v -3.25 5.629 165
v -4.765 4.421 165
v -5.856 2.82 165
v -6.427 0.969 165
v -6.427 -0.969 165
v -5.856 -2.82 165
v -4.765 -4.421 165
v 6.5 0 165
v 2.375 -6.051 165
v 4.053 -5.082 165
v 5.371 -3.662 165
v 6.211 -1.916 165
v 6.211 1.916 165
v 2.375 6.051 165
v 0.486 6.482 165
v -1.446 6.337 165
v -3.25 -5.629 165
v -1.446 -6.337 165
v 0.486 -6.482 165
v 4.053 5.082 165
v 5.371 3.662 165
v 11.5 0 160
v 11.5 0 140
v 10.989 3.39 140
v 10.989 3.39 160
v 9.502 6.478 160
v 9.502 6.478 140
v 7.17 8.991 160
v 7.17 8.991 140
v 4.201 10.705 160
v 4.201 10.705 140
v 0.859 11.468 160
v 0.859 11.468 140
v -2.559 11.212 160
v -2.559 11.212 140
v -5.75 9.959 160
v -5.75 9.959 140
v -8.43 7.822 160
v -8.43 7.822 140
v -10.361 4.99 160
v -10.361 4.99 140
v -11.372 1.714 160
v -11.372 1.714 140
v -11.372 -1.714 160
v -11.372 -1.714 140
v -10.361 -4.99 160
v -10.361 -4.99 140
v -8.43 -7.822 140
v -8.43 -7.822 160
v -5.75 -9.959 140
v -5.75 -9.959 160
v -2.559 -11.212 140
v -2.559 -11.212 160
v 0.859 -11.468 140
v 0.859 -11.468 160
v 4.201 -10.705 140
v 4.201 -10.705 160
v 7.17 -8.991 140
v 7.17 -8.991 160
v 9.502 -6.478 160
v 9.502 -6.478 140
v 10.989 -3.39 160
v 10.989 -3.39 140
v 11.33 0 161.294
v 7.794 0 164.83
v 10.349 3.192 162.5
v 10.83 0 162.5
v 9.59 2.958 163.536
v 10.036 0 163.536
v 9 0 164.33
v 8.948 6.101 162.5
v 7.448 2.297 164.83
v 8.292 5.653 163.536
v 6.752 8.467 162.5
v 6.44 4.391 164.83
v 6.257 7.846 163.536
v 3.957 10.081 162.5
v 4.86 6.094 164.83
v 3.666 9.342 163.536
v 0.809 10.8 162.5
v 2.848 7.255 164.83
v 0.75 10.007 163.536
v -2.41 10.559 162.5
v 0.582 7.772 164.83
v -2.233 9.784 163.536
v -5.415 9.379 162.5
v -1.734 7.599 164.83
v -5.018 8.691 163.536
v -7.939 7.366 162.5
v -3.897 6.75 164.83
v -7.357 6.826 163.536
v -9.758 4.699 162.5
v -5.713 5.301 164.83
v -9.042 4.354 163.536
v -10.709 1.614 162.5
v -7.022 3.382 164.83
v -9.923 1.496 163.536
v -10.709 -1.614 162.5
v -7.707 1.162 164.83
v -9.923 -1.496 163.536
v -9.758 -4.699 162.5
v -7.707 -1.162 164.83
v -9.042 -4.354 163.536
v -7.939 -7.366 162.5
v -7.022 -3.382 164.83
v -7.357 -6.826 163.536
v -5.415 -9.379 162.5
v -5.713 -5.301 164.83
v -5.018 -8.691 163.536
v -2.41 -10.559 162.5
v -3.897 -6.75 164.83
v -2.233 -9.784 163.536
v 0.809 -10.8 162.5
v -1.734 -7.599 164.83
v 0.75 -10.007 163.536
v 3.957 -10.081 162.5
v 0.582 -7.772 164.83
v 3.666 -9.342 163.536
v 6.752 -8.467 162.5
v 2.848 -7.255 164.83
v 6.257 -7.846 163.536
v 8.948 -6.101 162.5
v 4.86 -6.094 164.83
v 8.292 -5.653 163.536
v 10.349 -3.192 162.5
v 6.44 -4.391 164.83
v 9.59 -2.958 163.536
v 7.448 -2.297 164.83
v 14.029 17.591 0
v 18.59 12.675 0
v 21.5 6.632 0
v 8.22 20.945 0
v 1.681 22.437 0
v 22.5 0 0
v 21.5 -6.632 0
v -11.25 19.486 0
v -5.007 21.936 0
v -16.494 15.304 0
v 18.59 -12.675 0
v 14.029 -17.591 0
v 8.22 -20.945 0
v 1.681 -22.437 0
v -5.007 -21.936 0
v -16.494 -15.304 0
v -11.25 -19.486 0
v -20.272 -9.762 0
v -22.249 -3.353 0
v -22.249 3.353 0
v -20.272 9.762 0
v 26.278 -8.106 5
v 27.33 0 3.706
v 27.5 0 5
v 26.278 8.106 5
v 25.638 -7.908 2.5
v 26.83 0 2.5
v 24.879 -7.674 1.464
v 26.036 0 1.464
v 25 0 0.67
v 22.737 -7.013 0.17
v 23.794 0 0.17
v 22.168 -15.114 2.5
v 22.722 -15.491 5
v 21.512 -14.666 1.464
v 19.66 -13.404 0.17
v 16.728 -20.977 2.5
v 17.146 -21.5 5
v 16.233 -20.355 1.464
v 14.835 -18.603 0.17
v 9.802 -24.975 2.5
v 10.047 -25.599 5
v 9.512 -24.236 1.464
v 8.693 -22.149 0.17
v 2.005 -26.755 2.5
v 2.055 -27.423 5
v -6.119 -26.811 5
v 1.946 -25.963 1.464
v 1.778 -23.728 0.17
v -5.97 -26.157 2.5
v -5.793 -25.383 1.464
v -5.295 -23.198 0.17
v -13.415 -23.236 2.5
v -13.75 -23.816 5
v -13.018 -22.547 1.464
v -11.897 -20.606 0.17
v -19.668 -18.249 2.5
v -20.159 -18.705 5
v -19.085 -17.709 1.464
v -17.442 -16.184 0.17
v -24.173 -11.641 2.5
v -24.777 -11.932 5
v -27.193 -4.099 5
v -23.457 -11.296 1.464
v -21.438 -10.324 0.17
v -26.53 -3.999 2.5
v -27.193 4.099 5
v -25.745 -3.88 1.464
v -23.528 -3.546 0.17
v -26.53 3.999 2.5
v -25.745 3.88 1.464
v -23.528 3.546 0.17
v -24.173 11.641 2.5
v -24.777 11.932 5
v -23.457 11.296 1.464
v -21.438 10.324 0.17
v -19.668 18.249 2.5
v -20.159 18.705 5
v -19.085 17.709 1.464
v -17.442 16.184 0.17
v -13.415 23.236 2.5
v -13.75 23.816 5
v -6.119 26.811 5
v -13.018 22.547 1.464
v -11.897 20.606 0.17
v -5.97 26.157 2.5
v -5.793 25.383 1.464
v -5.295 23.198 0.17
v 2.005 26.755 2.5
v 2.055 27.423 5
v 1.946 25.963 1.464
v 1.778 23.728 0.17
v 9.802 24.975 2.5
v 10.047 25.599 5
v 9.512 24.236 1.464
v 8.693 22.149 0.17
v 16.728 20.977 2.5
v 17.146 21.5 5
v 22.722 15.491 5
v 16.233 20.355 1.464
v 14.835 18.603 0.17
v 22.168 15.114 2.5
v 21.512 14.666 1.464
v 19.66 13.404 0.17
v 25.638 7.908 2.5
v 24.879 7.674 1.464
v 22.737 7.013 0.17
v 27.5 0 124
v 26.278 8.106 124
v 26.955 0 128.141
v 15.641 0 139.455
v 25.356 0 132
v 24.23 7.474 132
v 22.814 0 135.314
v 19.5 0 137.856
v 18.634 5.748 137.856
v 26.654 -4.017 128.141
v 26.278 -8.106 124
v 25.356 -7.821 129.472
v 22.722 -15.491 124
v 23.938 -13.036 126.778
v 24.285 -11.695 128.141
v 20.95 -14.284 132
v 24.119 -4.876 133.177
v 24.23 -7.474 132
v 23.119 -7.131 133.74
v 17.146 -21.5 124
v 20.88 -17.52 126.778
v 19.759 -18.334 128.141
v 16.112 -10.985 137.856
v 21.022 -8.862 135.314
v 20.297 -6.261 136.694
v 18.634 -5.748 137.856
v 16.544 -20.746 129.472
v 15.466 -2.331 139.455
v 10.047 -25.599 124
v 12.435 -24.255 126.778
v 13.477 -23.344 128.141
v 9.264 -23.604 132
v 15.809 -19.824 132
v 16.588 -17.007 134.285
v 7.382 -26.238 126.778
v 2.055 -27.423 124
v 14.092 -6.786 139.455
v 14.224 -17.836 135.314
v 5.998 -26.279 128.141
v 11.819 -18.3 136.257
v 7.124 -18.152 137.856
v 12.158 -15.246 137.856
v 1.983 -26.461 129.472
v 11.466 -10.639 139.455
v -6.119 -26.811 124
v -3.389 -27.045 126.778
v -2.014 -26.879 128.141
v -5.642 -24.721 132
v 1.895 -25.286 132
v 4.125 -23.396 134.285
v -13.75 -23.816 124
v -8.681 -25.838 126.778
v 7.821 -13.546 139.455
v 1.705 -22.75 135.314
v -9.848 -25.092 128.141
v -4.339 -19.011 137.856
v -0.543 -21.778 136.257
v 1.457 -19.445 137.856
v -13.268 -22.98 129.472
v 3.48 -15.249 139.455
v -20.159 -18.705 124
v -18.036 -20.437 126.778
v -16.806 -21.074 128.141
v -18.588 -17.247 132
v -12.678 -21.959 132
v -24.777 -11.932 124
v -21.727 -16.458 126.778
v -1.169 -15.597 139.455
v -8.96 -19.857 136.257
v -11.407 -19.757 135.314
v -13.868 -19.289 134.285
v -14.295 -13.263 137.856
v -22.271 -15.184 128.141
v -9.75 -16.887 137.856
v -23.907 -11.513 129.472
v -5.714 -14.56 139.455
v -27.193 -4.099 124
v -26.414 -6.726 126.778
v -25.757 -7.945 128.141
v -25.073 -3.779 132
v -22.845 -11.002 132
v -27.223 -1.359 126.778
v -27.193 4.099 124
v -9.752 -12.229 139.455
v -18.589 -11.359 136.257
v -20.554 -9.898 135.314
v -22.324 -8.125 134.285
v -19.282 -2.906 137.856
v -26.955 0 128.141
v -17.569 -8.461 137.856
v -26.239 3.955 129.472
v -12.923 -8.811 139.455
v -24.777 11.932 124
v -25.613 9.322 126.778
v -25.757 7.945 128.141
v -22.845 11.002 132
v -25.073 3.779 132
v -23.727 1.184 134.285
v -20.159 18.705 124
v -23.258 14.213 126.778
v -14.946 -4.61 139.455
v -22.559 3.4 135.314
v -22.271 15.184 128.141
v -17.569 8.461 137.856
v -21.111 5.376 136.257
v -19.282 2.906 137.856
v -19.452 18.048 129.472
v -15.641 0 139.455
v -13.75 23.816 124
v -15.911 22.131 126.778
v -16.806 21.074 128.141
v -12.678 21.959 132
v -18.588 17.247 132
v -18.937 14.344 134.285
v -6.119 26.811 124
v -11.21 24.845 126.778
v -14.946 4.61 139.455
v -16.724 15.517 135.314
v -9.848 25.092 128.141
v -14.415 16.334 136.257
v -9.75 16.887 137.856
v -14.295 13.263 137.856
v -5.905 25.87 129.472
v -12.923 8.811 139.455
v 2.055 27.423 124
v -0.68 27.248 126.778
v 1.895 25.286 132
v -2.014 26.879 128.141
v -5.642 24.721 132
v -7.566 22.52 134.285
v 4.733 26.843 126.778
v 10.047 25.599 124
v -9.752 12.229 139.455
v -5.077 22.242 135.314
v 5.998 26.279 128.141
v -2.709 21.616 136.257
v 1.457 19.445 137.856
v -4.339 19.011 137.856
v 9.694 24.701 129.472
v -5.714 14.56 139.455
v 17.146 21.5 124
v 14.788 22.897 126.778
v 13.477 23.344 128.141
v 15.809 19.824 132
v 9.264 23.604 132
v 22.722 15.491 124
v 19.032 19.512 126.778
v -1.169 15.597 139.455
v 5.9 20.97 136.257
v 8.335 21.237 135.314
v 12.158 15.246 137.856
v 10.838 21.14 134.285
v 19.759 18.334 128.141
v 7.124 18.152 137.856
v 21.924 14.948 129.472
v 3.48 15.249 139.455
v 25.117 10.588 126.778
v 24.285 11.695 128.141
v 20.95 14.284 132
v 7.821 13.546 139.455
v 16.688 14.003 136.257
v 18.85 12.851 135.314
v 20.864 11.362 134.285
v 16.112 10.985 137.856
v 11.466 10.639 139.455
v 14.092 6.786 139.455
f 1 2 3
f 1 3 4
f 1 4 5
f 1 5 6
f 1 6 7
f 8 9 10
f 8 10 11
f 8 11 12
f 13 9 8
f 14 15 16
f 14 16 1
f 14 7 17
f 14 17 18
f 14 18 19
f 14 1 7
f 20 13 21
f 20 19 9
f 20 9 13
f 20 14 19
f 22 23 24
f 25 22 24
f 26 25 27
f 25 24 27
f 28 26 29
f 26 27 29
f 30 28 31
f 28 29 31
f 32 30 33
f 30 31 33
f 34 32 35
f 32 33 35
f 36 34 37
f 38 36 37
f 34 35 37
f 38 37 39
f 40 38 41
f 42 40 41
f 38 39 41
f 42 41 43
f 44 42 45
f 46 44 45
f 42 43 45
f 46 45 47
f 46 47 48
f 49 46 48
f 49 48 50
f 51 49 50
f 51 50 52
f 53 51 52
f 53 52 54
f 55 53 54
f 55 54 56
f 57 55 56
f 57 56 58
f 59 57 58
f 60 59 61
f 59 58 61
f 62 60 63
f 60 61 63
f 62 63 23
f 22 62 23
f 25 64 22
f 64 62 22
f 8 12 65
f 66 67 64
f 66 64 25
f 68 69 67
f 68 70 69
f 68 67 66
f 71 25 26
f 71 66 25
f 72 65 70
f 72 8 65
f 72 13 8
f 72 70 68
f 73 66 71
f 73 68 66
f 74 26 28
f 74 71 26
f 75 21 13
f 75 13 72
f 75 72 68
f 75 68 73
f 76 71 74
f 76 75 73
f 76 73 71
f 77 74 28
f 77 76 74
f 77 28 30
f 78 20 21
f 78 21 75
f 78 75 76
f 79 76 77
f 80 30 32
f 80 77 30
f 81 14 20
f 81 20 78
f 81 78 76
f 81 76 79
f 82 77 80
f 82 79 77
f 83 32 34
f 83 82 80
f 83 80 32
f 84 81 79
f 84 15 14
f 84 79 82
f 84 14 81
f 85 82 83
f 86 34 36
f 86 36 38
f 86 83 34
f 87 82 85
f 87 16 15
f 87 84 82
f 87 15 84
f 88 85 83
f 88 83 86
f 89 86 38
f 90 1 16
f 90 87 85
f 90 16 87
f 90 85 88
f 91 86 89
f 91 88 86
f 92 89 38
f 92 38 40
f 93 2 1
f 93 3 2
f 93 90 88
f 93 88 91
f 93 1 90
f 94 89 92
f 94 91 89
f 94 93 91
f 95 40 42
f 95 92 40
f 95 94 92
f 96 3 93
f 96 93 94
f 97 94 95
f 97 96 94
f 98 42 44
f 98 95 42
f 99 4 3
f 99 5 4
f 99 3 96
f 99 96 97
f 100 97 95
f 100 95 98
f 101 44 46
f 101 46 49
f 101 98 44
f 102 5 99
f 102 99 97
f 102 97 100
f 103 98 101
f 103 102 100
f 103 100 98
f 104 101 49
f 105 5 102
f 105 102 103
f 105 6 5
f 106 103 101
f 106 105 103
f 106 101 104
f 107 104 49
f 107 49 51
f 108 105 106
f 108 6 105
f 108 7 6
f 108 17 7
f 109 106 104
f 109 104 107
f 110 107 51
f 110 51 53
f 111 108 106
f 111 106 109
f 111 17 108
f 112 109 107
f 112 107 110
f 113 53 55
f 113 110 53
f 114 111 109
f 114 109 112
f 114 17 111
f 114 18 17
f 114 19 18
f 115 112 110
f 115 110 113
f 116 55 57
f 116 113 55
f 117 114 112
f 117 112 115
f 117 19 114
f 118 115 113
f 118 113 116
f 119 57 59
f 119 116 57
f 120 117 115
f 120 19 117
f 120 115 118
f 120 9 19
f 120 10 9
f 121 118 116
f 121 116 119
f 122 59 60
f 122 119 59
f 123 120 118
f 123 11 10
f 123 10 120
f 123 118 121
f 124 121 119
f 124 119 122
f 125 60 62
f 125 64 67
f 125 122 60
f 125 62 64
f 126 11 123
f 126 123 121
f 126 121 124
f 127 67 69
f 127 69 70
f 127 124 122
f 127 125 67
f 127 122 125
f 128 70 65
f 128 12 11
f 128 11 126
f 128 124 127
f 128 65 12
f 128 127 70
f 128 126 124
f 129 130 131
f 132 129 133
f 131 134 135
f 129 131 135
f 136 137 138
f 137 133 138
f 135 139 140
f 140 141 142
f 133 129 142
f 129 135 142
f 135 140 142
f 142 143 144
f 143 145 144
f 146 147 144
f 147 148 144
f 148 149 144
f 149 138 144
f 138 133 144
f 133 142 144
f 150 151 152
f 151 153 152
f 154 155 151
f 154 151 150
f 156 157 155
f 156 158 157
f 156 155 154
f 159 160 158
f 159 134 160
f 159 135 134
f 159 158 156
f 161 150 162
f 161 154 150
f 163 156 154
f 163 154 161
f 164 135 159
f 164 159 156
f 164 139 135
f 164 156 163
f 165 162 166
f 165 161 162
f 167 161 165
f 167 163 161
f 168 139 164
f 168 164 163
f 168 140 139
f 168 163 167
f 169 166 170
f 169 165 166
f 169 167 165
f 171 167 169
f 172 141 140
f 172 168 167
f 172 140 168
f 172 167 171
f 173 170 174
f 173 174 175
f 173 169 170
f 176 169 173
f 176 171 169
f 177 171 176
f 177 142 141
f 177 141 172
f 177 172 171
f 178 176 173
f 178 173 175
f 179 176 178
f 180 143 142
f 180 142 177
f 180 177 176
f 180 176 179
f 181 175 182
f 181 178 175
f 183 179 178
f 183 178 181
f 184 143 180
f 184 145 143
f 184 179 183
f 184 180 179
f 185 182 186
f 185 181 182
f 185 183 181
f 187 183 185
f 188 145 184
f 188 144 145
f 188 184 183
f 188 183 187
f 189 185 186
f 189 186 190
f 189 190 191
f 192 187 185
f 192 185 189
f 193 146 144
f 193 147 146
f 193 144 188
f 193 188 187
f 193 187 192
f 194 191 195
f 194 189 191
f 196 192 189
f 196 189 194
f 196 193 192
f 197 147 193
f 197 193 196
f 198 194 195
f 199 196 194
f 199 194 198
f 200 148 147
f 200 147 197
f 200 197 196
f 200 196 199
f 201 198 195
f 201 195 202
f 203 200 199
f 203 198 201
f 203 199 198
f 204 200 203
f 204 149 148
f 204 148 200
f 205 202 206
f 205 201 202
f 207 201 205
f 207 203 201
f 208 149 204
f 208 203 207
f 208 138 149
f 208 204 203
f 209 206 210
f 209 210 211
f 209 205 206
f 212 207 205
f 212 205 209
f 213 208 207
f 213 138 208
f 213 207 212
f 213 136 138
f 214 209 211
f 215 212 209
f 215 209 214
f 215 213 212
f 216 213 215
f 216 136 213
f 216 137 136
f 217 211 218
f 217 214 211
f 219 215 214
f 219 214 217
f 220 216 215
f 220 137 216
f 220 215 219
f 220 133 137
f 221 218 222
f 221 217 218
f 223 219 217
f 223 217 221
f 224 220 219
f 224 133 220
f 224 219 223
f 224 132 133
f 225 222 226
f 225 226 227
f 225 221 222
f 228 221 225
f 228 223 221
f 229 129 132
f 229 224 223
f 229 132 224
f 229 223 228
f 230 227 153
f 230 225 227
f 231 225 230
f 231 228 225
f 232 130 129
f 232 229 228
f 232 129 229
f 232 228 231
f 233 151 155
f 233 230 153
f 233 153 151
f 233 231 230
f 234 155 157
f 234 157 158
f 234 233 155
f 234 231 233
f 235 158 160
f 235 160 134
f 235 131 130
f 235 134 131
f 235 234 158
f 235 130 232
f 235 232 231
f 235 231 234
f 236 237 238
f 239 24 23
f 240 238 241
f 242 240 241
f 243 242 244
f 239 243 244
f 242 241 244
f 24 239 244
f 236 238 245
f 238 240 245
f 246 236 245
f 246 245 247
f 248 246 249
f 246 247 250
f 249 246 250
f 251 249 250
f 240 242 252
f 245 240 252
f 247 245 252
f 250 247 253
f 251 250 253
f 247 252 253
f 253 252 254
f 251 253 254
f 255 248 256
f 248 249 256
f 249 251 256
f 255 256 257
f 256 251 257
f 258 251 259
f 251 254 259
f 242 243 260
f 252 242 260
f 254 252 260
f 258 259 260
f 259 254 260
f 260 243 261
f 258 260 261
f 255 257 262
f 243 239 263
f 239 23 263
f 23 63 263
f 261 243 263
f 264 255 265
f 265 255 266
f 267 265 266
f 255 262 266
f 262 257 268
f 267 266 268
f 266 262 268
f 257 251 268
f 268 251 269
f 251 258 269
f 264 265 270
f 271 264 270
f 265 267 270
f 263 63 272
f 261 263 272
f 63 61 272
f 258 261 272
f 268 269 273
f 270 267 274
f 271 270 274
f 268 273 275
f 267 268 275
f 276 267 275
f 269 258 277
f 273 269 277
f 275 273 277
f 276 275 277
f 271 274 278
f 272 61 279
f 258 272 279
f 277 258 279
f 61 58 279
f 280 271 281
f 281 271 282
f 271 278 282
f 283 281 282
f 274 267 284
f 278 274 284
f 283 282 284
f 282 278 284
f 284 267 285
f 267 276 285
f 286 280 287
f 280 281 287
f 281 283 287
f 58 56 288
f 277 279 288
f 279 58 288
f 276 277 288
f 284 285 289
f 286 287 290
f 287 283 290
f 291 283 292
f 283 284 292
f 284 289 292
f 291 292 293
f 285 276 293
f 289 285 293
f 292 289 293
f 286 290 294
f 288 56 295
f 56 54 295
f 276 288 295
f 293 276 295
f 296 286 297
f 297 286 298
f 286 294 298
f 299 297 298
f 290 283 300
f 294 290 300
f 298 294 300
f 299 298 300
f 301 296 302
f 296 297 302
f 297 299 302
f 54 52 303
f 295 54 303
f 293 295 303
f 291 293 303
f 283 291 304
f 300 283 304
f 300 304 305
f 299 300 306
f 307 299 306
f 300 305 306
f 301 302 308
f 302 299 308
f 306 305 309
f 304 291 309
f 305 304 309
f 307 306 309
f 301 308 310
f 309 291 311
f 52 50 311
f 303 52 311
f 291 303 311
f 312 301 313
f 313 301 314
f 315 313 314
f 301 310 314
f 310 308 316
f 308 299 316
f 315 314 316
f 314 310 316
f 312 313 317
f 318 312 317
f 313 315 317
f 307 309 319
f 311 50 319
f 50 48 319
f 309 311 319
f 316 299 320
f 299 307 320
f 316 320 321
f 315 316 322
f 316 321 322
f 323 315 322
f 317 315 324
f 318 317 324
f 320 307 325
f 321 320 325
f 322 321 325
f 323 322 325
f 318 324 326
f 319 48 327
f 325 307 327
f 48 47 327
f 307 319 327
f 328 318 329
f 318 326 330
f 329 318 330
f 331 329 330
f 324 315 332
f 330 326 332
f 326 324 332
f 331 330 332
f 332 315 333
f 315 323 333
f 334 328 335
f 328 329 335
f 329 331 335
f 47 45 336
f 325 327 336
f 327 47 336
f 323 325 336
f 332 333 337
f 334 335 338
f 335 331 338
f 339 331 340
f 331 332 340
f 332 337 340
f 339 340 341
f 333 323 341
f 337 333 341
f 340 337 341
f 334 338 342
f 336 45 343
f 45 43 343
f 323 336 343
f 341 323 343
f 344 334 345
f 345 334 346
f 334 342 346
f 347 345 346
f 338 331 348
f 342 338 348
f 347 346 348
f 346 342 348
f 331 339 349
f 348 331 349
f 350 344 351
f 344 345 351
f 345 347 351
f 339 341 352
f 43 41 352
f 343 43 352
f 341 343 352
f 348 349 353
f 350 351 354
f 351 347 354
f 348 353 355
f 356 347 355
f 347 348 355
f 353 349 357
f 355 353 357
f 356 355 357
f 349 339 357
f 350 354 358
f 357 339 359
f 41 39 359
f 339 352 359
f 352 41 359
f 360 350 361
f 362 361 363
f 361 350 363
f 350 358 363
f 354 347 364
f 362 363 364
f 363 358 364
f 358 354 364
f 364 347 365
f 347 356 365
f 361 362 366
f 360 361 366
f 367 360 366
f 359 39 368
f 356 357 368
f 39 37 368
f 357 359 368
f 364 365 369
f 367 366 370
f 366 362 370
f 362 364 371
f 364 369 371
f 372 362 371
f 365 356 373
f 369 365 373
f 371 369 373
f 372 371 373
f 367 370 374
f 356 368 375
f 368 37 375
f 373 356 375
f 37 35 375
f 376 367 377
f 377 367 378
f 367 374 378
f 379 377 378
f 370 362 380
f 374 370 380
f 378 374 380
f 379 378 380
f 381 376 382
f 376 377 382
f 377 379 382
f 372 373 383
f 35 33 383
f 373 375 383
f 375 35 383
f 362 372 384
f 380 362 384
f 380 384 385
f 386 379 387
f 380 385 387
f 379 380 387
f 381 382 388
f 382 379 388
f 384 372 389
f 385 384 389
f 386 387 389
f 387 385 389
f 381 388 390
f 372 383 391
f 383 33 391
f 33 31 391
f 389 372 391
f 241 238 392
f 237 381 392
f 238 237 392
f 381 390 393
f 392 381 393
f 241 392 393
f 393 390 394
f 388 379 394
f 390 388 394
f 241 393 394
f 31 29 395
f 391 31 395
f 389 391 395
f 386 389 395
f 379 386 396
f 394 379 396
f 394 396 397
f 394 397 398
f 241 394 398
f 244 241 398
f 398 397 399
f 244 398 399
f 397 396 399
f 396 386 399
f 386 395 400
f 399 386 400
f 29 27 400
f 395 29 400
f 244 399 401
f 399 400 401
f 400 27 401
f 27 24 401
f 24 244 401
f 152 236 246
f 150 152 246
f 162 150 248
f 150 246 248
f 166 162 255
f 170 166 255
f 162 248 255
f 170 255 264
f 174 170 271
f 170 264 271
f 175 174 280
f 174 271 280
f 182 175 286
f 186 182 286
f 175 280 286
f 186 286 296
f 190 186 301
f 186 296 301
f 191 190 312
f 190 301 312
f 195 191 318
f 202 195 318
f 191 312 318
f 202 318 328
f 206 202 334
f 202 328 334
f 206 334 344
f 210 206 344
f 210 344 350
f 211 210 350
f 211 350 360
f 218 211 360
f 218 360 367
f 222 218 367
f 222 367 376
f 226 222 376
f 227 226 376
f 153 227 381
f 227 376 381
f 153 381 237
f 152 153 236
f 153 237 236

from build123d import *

# Parameters (mm, degrees)
F2_R     = 11.5
F3_DEPTH = 25
F4_R     = 5
F5_R     = 5


with BuildPart() as f1:
    # F0 (on Front) → F1 (revolve)
    with BuildSketch(Plane.XZ):
        with BuildLine():
            Line((0, 140), (0, 0))
            Line((0, 0), (27.5, 0))
            Line((27.5, 0), (27.5, 124))
            ThreePointArc((27.5, 124), (22.813708, 135.313708), (11.5, 140))
            Line((11.5, 140), (0, 140))
        make_face()
    revolve(axis=Axis((0, 0, 70), (0, 0, -1)))

    # F2 (on face) → F3 (join)
    with BuildSketch(Plane.XY.offset(140)):
        Circle(F2_R)
    extrude(amount=F3_DEPTH)

    # F4
    f4_edges = [f1.edges().sort_by_distance(p)[0] for p in [
        (-11.5, 0, 165),
    ]]
    fillet(f4_edges, radius=F4_R)

    # F5
    f5_edges = [f1.edges().sort_by_distance(p)[0] for p in [
        (-27.5, 0, 0),
    ]]
    fillet(f5_edges, radius=F5_R)


solid = f1.part
